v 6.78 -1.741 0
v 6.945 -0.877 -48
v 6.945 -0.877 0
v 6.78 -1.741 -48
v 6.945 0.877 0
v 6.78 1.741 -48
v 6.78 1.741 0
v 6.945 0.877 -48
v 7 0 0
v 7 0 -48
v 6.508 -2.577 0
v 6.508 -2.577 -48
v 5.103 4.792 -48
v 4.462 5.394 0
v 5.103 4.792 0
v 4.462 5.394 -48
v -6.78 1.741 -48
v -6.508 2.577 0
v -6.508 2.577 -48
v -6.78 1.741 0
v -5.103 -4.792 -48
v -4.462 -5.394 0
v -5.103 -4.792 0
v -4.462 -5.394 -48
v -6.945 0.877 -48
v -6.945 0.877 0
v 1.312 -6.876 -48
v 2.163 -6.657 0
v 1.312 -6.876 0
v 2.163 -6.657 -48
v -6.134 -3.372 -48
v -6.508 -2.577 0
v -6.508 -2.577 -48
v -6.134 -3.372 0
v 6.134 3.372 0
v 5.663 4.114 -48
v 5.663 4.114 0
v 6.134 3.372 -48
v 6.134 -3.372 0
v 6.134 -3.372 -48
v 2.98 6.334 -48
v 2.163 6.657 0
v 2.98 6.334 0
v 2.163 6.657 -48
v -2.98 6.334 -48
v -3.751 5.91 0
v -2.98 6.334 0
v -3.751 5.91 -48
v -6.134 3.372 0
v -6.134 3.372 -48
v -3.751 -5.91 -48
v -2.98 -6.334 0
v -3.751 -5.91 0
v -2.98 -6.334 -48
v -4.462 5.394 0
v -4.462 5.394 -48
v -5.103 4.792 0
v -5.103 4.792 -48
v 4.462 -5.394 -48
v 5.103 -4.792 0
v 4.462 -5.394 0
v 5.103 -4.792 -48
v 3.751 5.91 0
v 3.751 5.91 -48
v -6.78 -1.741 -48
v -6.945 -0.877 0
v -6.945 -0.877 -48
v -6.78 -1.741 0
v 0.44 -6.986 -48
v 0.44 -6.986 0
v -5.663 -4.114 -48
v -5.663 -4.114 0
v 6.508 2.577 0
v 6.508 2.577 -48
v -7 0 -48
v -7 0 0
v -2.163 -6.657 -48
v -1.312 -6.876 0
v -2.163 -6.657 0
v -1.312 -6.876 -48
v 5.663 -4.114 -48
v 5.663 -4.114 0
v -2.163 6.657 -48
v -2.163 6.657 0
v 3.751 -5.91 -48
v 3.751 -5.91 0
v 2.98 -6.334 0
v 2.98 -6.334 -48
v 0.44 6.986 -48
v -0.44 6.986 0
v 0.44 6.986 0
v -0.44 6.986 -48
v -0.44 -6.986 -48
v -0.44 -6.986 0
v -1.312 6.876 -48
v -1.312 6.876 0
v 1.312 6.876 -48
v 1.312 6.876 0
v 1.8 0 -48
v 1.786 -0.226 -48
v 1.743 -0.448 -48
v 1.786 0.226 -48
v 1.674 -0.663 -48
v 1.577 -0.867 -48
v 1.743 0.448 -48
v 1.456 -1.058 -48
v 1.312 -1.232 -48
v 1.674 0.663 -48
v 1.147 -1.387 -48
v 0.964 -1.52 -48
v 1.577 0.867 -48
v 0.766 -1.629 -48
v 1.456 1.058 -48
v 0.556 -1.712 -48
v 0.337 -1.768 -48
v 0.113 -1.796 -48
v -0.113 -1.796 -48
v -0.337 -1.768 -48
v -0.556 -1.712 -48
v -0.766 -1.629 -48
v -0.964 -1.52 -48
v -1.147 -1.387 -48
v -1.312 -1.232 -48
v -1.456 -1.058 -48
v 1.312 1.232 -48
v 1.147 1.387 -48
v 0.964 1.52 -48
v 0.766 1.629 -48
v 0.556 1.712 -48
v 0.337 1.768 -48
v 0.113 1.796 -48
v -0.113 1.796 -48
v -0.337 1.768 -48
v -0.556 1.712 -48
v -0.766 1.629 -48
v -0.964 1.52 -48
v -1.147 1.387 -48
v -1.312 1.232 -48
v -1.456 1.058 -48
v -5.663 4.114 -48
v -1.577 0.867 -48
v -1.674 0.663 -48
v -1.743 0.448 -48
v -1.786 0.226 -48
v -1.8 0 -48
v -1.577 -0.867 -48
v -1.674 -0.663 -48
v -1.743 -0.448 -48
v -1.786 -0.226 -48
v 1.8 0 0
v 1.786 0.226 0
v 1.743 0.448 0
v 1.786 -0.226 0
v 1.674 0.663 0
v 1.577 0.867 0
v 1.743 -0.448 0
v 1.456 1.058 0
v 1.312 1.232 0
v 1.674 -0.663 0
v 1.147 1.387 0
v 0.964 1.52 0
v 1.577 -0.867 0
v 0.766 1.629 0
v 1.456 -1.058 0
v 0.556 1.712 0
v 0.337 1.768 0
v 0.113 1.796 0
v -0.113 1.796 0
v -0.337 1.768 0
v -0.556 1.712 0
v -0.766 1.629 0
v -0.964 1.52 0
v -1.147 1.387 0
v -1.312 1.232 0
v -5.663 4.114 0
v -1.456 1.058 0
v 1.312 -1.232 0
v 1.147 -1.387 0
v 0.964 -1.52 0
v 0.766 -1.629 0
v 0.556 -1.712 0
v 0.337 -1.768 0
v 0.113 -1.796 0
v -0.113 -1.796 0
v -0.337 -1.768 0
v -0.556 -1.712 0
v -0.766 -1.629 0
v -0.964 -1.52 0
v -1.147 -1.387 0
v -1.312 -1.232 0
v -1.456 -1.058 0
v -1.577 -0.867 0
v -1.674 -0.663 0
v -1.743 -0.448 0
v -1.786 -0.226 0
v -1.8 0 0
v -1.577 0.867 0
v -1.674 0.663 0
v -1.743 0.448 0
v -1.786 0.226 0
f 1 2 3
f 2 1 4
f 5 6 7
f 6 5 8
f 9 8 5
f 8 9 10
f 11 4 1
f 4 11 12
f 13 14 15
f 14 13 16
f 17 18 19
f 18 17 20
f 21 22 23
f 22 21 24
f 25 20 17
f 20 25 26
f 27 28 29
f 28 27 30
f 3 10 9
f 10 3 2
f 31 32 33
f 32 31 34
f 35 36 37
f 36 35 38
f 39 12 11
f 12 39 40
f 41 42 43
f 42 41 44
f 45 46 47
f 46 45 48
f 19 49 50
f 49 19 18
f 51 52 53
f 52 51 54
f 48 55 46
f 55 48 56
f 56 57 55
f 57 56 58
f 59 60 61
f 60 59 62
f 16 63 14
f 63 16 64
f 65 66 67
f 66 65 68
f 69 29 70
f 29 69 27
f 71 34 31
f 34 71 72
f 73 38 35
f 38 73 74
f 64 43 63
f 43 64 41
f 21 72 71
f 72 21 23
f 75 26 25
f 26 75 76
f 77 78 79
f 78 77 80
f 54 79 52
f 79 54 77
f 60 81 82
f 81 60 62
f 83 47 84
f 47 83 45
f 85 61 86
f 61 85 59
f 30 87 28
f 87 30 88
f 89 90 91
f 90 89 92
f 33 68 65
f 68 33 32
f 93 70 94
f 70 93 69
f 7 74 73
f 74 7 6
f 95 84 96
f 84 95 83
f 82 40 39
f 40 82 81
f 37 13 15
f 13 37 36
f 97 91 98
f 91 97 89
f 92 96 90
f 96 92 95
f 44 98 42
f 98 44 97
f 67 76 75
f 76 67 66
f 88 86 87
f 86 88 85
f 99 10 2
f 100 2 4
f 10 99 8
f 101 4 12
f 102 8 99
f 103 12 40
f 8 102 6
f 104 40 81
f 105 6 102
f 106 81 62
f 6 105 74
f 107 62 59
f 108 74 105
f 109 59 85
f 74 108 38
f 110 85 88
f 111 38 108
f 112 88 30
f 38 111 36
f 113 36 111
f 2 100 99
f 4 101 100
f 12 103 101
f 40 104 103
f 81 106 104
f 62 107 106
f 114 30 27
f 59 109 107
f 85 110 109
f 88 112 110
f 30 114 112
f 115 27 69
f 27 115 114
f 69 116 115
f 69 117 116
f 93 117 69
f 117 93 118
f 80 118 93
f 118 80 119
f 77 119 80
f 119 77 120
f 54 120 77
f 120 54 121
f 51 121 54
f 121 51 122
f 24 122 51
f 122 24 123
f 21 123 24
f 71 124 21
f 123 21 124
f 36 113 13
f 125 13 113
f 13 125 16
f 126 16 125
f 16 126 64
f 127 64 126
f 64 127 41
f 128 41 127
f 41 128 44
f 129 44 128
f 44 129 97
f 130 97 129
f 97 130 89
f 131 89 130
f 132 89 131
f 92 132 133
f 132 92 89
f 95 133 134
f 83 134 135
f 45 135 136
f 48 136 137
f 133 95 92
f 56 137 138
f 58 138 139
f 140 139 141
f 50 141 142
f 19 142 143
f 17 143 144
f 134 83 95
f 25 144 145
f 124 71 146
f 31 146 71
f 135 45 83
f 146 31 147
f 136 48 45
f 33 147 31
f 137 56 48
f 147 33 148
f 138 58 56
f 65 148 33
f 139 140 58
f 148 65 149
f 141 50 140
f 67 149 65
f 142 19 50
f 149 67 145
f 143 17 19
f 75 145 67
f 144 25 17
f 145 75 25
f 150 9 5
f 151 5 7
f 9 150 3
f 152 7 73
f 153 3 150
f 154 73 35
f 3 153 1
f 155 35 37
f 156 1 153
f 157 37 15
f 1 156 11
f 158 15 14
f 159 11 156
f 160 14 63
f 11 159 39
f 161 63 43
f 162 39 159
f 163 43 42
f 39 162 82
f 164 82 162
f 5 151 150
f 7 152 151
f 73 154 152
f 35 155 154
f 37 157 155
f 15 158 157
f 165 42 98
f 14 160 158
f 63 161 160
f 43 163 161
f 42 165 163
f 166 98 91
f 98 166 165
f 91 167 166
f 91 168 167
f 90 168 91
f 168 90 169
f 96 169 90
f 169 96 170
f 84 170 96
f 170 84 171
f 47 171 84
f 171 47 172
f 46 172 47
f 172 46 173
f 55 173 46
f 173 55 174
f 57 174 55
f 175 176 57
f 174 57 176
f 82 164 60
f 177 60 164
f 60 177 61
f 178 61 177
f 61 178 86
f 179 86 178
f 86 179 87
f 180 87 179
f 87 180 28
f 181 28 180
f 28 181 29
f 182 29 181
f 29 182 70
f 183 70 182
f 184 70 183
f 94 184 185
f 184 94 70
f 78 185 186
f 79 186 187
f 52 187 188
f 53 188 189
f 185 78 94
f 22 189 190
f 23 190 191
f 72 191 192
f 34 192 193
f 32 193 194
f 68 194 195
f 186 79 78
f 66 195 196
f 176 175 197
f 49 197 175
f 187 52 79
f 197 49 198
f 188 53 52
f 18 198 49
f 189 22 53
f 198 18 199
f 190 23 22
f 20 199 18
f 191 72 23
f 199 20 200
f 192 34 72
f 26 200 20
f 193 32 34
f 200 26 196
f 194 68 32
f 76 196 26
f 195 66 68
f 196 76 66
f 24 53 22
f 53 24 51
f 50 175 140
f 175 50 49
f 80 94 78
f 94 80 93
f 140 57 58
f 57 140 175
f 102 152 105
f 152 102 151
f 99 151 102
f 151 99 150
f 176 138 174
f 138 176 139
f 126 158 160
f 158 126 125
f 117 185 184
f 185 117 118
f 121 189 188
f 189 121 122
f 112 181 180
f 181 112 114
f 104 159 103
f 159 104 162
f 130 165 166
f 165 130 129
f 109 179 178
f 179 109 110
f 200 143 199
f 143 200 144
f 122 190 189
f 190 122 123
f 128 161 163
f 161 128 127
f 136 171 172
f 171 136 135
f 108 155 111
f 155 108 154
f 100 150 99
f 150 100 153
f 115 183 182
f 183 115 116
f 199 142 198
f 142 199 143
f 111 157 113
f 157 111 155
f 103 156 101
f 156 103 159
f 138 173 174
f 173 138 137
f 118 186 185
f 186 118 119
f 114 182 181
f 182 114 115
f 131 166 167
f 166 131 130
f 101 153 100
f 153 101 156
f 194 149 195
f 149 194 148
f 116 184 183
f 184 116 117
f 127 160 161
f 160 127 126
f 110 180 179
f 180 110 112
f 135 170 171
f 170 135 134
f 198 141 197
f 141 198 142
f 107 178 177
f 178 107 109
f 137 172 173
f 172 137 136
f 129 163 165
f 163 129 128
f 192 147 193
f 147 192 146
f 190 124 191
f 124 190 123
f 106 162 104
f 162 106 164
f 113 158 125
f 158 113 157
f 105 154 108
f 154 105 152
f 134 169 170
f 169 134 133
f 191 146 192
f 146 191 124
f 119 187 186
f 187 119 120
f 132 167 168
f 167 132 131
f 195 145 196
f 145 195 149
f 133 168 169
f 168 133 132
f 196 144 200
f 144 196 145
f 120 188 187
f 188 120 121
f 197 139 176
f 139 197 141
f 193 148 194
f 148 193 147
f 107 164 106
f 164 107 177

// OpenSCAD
$fn = 50;


difference() {
	union() {
		translate(v = [0, 0, -48.0000000000]) {
			cylinder(h = 48, r = 7.0000000000);
		}
		cylinder(h = 0, r = 10.0000000000);
	}
	union() {
		#translate(v = [0, 0, -48]) {
			cylinder(h = 48, r = 1.8000000000);
		}
	}
}
